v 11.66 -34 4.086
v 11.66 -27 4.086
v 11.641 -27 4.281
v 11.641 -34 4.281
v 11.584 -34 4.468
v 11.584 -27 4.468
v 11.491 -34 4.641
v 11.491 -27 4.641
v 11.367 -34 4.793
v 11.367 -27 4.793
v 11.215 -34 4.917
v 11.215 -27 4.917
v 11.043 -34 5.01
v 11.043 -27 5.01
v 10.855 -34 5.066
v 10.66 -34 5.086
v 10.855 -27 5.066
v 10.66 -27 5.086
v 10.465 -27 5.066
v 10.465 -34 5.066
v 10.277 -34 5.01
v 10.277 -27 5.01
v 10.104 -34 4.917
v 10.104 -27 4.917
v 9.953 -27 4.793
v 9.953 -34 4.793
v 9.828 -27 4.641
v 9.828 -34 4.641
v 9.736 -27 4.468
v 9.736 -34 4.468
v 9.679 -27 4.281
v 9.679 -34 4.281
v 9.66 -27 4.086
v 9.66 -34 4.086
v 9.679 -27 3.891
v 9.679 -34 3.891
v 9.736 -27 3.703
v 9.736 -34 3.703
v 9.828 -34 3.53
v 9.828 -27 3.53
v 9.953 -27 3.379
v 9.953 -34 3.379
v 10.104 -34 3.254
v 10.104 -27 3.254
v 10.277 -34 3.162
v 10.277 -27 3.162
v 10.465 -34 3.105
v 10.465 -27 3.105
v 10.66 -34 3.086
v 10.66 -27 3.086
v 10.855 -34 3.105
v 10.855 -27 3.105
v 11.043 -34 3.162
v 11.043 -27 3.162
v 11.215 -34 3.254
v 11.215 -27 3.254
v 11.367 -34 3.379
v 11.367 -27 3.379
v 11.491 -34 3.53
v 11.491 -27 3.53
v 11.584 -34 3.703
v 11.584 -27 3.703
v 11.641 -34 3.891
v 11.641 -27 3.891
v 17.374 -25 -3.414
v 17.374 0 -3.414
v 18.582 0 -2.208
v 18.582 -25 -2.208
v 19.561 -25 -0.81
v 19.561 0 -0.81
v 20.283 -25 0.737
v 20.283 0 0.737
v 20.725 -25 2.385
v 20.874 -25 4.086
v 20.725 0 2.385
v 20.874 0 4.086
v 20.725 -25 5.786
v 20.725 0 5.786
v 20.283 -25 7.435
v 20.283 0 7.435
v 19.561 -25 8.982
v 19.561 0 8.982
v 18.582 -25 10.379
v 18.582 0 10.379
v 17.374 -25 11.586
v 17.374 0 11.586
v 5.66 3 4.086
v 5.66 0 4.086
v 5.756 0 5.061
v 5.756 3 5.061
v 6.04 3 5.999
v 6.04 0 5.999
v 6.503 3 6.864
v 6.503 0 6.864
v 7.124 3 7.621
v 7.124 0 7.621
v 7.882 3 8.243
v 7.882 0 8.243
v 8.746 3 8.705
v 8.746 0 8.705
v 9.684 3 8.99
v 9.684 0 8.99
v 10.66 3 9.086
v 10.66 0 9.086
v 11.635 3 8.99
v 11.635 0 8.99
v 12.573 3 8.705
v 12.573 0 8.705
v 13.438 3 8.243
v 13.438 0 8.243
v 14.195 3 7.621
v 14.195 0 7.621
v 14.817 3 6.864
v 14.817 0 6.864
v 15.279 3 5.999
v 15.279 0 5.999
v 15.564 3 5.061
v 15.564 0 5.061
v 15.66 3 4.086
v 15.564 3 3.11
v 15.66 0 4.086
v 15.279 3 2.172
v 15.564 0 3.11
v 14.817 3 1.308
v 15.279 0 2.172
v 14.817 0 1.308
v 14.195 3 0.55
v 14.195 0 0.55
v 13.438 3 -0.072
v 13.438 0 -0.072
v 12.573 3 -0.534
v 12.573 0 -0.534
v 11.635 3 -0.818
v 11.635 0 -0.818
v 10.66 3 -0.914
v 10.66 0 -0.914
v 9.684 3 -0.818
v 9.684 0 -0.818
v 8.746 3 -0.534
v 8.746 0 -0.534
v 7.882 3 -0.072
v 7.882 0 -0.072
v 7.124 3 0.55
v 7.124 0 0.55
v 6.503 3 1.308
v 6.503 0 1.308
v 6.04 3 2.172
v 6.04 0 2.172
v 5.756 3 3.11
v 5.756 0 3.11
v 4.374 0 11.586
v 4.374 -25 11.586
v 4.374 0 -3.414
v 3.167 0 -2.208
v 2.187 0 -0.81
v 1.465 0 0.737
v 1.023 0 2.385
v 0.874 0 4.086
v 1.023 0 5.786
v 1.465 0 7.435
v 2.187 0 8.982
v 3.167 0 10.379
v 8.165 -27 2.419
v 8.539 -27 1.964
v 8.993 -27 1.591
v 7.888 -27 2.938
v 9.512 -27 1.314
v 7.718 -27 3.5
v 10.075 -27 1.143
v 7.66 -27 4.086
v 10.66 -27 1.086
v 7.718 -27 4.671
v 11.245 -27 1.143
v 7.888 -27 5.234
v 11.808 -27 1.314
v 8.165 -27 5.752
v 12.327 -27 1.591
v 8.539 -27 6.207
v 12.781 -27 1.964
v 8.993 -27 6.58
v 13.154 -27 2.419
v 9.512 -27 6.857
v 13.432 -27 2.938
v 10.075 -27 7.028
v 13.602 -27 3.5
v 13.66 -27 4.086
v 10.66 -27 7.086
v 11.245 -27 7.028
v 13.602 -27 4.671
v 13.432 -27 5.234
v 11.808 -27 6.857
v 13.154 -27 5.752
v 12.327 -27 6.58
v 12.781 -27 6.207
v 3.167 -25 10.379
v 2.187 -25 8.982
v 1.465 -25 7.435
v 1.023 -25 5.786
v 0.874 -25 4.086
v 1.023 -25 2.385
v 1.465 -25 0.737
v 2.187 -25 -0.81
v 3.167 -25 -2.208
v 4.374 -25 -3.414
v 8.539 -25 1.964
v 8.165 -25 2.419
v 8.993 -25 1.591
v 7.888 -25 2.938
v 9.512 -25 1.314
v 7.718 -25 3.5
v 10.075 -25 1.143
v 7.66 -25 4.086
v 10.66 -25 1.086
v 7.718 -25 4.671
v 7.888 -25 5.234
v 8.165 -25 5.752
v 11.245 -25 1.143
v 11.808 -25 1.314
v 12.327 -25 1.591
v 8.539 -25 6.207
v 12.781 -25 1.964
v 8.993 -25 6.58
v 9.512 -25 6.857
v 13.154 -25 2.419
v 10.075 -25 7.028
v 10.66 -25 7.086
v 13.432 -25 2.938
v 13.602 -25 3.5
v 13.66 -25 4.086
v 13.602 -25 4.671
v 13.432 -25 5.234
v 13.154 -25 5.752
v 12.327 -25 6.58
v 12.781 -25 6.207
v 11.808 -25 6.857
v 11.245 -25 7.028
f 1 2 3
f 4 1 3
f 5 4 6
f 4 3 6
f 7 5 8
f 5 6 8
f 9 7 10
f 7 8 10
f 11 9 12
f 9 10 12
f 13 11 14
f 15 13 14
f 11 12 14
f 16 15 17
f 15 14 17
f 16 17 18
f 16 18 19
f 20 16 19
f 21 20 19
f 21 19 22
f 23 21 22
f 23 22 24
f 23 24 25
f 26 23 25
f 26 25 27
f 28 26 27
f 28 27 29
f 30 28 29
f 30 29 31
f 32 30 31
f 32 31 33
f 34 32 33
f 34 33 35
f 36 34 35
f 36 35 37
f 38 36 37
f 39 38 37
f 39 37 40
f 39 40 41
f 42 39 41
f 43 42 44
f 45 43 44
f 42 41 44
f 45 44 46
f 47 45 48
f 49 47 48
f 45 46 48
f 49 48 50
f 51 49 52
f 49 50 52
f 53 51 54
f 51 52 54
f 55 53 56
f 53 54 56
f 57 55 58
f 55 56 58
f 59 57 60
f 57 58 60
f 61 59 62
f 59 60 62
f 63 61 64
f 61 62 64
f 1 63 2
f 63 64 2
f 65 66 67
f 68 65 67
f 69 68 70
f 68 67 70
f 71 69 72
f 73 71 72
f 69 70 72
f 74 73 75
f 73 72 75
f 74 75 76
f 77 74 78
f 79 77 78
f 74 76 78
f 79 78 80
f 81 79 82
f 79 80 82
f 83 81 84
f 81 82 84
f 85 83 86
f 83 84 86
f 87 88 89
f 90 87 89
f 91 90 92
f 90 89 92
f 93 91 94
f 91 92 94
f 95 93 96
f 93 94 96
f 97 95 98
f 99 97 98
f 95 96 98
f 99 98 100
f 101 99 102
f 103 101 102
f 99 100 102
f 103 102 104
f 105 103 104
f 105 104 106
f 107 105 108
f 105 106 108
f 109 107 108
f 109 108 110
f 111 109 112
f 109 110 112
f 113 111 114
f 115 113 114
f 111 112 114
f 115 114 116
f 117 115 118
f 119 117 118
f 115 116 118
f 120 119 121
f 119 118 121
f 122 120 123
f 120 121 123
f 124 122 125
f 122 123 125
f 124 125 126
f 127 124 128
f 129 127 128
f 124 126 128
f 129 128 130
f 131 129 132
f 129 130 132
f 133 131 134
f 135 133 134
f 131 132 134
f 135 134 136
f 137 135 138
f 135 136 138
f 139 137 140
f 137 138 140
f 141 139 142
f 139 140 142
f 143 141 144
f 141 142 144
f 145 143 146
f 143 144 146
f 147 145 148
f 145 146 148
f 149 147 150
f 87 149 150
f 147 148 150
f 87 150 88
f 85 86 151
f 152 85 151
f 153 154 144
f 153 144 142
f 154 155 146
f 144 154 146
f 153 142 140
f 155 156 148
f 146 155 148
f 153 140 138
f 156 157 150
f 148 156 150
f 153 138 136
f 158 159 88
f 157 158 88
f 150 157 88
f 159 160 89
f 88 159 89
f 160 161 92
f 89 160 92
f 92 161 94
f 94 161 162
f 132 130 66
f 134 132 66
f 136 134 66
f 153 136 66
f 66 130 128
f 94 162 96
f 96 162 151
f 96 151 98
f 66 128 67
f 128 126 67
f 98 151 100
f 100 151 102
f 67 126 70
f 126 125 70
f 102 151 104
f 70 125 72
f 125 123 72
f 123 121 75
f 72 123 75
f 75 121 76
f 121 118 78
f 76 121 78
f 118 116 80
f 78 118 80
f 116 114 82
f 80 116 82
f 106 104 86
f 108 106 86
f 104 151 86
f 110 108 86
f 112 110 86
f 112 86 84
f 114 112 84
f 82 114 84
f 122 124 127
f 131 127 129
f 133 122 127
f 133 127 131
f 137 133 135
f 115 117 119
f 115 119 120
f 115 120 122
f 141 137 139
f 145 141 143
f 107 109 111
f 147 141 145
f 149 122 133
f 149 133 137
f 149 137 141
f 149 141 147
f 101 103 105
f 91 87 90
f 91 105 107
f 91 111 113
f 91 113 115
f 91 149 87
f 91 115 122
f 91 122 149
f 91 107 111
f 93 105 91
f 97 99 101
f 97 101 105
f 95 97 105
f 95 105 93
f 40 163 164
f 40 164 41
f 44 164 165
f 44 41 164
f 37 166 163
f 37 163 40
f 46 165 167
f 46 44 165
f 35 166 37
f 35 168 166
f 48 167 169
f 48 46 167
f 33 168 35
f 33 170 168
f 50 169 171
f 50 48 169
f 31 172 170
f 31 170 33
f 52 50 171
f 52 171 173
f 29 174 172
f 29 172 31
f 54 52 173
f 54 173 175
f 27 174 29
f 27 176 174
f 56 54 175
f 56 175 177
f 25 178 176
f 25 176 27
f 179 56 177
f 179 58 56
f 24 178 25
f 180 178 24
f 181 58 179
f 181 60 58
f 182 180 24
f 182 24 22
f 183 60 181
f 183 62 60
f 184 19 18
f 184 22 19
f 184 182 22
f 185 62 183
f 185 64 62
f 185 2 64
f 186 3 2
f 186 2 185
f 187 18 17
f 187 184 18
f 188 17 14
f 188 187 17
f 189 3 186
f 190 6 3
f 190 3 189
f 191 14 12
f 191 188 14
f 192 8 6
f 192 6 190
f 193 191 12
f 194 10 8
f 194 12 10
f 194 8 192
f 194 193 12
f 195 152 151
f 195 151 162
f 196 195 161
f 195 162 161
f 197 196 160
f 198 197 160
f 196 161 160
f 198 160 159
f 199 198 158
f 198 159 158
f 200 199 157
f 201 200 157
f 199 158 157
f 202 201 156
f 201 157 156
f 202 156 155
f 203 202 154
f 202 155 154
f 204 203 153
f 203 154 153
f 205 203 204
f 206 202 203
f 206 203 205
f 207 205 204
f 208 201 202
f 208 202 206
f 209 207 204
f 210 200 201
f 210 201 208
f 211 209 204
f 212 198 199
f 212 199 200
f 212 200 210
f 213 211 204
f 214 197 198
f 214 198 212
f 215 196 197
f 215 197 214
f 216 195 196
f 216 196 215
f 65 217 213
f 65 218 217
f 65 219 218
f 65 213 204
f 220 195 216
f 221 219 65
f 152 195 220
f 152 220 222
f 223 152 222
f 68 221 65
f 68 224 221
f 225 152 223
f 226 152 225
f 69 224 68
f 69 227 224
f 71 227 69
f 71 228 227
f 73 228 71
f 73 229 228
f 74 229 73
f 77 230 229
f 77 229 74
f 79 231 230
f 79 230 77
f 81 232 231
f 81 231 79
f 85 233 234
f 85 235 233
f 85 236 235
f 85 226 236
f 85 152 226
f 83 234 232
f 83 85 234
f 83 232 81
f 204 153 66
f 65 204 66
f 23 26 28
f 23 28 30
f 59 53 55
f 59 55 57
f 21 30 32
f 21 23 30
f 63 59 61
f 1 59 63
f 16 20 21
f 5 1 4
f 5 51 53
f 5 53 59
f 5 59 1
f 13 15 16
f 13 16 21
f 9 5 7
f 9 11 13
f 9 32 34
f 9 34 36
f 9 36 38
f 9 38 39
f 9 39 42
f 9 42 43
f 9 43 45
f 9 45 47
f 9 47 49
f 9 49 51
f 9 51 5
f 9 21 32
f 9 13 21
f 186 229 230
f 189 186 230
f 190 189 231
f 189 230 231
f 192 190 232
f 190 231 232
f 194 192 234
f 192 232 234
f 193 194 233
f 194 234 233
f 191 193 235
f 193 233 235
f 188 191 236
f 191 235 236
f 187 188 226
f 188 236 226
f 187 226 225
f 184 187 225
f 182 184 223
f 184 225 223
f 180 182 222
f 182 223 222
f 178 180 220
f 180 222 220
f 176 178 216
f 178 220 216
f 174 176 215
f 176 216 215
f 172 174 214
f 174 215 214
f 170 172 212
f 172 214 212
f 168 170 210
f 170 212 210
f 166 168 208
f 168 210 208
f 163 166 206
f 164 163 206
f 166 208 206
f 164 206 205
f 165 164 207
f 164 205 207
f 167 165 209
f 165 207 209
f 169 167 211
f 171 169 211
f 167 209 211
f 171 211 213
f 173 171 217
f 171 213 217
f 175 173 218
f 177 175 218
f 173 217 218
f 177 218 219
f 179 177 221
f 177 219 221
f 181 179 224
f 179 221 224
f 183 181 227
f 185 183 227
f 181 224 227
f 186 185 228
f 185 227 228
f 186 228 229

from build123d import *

# Parameters (mm, degrees)
F1_DEPTH = 25
F2_R     = 3
F2_R_2   = 1
F3_DEPTH = 2
F4_DEPTH = 9
F5_R     = 5
F6_DEPTH = 3


with BuildPart() as f1:
    # F0 (on Front) → F1 (new body)
    with BuildSketch(Plane.XZ):
        with BuildLine():
            Line((17.374176, 11.585681), (4.374176, 11.585681))
            ThreePointArc((4.374176, 11.585681), (0.874176, 4.085681), (4.374176, -3.414319))
            Line((4.374176, -3.414319), (17.374176, -3.414319))
            ThreePointArc((17.374176, -3.414319), (20.874176, 4.085681), (17.374176, 11.585681))
        make_face()
    extrude(amount=F1_DEPTH)

    # F2 (on face) → F3 (join)
    with BuildSketch(Plane.XZ.offset(25)):
        with Locations((10.65989, 4.085681)):
            Circle(F2_R)
        with Locations((10.65989, 4.085681)):
            Circle(F2_R_2, mode=Mode.SUBTRACT)
    extrude(amount=F3_DEPTH)

    # F2 (on face) → F4 (join)
    with BuildSketch(Plane.XZ.offset(25)):
        with Locations((10.65989, 4.085681)):
            Circle(F2_R_2)
    extrude(amount=F4_DEPTH)

    # F5 (on face) → F6 (join)
    with BuildSketch(Plane(origin=(0, 0, 0), x_dir=(-1, 0, 0), z_dir=(0, 1, 0))):
        with Locations((-10.65989, 4.085681)):
            Circle(F5_R)
    extrude(amount=F6_DEPTH)


solid = f1.part
